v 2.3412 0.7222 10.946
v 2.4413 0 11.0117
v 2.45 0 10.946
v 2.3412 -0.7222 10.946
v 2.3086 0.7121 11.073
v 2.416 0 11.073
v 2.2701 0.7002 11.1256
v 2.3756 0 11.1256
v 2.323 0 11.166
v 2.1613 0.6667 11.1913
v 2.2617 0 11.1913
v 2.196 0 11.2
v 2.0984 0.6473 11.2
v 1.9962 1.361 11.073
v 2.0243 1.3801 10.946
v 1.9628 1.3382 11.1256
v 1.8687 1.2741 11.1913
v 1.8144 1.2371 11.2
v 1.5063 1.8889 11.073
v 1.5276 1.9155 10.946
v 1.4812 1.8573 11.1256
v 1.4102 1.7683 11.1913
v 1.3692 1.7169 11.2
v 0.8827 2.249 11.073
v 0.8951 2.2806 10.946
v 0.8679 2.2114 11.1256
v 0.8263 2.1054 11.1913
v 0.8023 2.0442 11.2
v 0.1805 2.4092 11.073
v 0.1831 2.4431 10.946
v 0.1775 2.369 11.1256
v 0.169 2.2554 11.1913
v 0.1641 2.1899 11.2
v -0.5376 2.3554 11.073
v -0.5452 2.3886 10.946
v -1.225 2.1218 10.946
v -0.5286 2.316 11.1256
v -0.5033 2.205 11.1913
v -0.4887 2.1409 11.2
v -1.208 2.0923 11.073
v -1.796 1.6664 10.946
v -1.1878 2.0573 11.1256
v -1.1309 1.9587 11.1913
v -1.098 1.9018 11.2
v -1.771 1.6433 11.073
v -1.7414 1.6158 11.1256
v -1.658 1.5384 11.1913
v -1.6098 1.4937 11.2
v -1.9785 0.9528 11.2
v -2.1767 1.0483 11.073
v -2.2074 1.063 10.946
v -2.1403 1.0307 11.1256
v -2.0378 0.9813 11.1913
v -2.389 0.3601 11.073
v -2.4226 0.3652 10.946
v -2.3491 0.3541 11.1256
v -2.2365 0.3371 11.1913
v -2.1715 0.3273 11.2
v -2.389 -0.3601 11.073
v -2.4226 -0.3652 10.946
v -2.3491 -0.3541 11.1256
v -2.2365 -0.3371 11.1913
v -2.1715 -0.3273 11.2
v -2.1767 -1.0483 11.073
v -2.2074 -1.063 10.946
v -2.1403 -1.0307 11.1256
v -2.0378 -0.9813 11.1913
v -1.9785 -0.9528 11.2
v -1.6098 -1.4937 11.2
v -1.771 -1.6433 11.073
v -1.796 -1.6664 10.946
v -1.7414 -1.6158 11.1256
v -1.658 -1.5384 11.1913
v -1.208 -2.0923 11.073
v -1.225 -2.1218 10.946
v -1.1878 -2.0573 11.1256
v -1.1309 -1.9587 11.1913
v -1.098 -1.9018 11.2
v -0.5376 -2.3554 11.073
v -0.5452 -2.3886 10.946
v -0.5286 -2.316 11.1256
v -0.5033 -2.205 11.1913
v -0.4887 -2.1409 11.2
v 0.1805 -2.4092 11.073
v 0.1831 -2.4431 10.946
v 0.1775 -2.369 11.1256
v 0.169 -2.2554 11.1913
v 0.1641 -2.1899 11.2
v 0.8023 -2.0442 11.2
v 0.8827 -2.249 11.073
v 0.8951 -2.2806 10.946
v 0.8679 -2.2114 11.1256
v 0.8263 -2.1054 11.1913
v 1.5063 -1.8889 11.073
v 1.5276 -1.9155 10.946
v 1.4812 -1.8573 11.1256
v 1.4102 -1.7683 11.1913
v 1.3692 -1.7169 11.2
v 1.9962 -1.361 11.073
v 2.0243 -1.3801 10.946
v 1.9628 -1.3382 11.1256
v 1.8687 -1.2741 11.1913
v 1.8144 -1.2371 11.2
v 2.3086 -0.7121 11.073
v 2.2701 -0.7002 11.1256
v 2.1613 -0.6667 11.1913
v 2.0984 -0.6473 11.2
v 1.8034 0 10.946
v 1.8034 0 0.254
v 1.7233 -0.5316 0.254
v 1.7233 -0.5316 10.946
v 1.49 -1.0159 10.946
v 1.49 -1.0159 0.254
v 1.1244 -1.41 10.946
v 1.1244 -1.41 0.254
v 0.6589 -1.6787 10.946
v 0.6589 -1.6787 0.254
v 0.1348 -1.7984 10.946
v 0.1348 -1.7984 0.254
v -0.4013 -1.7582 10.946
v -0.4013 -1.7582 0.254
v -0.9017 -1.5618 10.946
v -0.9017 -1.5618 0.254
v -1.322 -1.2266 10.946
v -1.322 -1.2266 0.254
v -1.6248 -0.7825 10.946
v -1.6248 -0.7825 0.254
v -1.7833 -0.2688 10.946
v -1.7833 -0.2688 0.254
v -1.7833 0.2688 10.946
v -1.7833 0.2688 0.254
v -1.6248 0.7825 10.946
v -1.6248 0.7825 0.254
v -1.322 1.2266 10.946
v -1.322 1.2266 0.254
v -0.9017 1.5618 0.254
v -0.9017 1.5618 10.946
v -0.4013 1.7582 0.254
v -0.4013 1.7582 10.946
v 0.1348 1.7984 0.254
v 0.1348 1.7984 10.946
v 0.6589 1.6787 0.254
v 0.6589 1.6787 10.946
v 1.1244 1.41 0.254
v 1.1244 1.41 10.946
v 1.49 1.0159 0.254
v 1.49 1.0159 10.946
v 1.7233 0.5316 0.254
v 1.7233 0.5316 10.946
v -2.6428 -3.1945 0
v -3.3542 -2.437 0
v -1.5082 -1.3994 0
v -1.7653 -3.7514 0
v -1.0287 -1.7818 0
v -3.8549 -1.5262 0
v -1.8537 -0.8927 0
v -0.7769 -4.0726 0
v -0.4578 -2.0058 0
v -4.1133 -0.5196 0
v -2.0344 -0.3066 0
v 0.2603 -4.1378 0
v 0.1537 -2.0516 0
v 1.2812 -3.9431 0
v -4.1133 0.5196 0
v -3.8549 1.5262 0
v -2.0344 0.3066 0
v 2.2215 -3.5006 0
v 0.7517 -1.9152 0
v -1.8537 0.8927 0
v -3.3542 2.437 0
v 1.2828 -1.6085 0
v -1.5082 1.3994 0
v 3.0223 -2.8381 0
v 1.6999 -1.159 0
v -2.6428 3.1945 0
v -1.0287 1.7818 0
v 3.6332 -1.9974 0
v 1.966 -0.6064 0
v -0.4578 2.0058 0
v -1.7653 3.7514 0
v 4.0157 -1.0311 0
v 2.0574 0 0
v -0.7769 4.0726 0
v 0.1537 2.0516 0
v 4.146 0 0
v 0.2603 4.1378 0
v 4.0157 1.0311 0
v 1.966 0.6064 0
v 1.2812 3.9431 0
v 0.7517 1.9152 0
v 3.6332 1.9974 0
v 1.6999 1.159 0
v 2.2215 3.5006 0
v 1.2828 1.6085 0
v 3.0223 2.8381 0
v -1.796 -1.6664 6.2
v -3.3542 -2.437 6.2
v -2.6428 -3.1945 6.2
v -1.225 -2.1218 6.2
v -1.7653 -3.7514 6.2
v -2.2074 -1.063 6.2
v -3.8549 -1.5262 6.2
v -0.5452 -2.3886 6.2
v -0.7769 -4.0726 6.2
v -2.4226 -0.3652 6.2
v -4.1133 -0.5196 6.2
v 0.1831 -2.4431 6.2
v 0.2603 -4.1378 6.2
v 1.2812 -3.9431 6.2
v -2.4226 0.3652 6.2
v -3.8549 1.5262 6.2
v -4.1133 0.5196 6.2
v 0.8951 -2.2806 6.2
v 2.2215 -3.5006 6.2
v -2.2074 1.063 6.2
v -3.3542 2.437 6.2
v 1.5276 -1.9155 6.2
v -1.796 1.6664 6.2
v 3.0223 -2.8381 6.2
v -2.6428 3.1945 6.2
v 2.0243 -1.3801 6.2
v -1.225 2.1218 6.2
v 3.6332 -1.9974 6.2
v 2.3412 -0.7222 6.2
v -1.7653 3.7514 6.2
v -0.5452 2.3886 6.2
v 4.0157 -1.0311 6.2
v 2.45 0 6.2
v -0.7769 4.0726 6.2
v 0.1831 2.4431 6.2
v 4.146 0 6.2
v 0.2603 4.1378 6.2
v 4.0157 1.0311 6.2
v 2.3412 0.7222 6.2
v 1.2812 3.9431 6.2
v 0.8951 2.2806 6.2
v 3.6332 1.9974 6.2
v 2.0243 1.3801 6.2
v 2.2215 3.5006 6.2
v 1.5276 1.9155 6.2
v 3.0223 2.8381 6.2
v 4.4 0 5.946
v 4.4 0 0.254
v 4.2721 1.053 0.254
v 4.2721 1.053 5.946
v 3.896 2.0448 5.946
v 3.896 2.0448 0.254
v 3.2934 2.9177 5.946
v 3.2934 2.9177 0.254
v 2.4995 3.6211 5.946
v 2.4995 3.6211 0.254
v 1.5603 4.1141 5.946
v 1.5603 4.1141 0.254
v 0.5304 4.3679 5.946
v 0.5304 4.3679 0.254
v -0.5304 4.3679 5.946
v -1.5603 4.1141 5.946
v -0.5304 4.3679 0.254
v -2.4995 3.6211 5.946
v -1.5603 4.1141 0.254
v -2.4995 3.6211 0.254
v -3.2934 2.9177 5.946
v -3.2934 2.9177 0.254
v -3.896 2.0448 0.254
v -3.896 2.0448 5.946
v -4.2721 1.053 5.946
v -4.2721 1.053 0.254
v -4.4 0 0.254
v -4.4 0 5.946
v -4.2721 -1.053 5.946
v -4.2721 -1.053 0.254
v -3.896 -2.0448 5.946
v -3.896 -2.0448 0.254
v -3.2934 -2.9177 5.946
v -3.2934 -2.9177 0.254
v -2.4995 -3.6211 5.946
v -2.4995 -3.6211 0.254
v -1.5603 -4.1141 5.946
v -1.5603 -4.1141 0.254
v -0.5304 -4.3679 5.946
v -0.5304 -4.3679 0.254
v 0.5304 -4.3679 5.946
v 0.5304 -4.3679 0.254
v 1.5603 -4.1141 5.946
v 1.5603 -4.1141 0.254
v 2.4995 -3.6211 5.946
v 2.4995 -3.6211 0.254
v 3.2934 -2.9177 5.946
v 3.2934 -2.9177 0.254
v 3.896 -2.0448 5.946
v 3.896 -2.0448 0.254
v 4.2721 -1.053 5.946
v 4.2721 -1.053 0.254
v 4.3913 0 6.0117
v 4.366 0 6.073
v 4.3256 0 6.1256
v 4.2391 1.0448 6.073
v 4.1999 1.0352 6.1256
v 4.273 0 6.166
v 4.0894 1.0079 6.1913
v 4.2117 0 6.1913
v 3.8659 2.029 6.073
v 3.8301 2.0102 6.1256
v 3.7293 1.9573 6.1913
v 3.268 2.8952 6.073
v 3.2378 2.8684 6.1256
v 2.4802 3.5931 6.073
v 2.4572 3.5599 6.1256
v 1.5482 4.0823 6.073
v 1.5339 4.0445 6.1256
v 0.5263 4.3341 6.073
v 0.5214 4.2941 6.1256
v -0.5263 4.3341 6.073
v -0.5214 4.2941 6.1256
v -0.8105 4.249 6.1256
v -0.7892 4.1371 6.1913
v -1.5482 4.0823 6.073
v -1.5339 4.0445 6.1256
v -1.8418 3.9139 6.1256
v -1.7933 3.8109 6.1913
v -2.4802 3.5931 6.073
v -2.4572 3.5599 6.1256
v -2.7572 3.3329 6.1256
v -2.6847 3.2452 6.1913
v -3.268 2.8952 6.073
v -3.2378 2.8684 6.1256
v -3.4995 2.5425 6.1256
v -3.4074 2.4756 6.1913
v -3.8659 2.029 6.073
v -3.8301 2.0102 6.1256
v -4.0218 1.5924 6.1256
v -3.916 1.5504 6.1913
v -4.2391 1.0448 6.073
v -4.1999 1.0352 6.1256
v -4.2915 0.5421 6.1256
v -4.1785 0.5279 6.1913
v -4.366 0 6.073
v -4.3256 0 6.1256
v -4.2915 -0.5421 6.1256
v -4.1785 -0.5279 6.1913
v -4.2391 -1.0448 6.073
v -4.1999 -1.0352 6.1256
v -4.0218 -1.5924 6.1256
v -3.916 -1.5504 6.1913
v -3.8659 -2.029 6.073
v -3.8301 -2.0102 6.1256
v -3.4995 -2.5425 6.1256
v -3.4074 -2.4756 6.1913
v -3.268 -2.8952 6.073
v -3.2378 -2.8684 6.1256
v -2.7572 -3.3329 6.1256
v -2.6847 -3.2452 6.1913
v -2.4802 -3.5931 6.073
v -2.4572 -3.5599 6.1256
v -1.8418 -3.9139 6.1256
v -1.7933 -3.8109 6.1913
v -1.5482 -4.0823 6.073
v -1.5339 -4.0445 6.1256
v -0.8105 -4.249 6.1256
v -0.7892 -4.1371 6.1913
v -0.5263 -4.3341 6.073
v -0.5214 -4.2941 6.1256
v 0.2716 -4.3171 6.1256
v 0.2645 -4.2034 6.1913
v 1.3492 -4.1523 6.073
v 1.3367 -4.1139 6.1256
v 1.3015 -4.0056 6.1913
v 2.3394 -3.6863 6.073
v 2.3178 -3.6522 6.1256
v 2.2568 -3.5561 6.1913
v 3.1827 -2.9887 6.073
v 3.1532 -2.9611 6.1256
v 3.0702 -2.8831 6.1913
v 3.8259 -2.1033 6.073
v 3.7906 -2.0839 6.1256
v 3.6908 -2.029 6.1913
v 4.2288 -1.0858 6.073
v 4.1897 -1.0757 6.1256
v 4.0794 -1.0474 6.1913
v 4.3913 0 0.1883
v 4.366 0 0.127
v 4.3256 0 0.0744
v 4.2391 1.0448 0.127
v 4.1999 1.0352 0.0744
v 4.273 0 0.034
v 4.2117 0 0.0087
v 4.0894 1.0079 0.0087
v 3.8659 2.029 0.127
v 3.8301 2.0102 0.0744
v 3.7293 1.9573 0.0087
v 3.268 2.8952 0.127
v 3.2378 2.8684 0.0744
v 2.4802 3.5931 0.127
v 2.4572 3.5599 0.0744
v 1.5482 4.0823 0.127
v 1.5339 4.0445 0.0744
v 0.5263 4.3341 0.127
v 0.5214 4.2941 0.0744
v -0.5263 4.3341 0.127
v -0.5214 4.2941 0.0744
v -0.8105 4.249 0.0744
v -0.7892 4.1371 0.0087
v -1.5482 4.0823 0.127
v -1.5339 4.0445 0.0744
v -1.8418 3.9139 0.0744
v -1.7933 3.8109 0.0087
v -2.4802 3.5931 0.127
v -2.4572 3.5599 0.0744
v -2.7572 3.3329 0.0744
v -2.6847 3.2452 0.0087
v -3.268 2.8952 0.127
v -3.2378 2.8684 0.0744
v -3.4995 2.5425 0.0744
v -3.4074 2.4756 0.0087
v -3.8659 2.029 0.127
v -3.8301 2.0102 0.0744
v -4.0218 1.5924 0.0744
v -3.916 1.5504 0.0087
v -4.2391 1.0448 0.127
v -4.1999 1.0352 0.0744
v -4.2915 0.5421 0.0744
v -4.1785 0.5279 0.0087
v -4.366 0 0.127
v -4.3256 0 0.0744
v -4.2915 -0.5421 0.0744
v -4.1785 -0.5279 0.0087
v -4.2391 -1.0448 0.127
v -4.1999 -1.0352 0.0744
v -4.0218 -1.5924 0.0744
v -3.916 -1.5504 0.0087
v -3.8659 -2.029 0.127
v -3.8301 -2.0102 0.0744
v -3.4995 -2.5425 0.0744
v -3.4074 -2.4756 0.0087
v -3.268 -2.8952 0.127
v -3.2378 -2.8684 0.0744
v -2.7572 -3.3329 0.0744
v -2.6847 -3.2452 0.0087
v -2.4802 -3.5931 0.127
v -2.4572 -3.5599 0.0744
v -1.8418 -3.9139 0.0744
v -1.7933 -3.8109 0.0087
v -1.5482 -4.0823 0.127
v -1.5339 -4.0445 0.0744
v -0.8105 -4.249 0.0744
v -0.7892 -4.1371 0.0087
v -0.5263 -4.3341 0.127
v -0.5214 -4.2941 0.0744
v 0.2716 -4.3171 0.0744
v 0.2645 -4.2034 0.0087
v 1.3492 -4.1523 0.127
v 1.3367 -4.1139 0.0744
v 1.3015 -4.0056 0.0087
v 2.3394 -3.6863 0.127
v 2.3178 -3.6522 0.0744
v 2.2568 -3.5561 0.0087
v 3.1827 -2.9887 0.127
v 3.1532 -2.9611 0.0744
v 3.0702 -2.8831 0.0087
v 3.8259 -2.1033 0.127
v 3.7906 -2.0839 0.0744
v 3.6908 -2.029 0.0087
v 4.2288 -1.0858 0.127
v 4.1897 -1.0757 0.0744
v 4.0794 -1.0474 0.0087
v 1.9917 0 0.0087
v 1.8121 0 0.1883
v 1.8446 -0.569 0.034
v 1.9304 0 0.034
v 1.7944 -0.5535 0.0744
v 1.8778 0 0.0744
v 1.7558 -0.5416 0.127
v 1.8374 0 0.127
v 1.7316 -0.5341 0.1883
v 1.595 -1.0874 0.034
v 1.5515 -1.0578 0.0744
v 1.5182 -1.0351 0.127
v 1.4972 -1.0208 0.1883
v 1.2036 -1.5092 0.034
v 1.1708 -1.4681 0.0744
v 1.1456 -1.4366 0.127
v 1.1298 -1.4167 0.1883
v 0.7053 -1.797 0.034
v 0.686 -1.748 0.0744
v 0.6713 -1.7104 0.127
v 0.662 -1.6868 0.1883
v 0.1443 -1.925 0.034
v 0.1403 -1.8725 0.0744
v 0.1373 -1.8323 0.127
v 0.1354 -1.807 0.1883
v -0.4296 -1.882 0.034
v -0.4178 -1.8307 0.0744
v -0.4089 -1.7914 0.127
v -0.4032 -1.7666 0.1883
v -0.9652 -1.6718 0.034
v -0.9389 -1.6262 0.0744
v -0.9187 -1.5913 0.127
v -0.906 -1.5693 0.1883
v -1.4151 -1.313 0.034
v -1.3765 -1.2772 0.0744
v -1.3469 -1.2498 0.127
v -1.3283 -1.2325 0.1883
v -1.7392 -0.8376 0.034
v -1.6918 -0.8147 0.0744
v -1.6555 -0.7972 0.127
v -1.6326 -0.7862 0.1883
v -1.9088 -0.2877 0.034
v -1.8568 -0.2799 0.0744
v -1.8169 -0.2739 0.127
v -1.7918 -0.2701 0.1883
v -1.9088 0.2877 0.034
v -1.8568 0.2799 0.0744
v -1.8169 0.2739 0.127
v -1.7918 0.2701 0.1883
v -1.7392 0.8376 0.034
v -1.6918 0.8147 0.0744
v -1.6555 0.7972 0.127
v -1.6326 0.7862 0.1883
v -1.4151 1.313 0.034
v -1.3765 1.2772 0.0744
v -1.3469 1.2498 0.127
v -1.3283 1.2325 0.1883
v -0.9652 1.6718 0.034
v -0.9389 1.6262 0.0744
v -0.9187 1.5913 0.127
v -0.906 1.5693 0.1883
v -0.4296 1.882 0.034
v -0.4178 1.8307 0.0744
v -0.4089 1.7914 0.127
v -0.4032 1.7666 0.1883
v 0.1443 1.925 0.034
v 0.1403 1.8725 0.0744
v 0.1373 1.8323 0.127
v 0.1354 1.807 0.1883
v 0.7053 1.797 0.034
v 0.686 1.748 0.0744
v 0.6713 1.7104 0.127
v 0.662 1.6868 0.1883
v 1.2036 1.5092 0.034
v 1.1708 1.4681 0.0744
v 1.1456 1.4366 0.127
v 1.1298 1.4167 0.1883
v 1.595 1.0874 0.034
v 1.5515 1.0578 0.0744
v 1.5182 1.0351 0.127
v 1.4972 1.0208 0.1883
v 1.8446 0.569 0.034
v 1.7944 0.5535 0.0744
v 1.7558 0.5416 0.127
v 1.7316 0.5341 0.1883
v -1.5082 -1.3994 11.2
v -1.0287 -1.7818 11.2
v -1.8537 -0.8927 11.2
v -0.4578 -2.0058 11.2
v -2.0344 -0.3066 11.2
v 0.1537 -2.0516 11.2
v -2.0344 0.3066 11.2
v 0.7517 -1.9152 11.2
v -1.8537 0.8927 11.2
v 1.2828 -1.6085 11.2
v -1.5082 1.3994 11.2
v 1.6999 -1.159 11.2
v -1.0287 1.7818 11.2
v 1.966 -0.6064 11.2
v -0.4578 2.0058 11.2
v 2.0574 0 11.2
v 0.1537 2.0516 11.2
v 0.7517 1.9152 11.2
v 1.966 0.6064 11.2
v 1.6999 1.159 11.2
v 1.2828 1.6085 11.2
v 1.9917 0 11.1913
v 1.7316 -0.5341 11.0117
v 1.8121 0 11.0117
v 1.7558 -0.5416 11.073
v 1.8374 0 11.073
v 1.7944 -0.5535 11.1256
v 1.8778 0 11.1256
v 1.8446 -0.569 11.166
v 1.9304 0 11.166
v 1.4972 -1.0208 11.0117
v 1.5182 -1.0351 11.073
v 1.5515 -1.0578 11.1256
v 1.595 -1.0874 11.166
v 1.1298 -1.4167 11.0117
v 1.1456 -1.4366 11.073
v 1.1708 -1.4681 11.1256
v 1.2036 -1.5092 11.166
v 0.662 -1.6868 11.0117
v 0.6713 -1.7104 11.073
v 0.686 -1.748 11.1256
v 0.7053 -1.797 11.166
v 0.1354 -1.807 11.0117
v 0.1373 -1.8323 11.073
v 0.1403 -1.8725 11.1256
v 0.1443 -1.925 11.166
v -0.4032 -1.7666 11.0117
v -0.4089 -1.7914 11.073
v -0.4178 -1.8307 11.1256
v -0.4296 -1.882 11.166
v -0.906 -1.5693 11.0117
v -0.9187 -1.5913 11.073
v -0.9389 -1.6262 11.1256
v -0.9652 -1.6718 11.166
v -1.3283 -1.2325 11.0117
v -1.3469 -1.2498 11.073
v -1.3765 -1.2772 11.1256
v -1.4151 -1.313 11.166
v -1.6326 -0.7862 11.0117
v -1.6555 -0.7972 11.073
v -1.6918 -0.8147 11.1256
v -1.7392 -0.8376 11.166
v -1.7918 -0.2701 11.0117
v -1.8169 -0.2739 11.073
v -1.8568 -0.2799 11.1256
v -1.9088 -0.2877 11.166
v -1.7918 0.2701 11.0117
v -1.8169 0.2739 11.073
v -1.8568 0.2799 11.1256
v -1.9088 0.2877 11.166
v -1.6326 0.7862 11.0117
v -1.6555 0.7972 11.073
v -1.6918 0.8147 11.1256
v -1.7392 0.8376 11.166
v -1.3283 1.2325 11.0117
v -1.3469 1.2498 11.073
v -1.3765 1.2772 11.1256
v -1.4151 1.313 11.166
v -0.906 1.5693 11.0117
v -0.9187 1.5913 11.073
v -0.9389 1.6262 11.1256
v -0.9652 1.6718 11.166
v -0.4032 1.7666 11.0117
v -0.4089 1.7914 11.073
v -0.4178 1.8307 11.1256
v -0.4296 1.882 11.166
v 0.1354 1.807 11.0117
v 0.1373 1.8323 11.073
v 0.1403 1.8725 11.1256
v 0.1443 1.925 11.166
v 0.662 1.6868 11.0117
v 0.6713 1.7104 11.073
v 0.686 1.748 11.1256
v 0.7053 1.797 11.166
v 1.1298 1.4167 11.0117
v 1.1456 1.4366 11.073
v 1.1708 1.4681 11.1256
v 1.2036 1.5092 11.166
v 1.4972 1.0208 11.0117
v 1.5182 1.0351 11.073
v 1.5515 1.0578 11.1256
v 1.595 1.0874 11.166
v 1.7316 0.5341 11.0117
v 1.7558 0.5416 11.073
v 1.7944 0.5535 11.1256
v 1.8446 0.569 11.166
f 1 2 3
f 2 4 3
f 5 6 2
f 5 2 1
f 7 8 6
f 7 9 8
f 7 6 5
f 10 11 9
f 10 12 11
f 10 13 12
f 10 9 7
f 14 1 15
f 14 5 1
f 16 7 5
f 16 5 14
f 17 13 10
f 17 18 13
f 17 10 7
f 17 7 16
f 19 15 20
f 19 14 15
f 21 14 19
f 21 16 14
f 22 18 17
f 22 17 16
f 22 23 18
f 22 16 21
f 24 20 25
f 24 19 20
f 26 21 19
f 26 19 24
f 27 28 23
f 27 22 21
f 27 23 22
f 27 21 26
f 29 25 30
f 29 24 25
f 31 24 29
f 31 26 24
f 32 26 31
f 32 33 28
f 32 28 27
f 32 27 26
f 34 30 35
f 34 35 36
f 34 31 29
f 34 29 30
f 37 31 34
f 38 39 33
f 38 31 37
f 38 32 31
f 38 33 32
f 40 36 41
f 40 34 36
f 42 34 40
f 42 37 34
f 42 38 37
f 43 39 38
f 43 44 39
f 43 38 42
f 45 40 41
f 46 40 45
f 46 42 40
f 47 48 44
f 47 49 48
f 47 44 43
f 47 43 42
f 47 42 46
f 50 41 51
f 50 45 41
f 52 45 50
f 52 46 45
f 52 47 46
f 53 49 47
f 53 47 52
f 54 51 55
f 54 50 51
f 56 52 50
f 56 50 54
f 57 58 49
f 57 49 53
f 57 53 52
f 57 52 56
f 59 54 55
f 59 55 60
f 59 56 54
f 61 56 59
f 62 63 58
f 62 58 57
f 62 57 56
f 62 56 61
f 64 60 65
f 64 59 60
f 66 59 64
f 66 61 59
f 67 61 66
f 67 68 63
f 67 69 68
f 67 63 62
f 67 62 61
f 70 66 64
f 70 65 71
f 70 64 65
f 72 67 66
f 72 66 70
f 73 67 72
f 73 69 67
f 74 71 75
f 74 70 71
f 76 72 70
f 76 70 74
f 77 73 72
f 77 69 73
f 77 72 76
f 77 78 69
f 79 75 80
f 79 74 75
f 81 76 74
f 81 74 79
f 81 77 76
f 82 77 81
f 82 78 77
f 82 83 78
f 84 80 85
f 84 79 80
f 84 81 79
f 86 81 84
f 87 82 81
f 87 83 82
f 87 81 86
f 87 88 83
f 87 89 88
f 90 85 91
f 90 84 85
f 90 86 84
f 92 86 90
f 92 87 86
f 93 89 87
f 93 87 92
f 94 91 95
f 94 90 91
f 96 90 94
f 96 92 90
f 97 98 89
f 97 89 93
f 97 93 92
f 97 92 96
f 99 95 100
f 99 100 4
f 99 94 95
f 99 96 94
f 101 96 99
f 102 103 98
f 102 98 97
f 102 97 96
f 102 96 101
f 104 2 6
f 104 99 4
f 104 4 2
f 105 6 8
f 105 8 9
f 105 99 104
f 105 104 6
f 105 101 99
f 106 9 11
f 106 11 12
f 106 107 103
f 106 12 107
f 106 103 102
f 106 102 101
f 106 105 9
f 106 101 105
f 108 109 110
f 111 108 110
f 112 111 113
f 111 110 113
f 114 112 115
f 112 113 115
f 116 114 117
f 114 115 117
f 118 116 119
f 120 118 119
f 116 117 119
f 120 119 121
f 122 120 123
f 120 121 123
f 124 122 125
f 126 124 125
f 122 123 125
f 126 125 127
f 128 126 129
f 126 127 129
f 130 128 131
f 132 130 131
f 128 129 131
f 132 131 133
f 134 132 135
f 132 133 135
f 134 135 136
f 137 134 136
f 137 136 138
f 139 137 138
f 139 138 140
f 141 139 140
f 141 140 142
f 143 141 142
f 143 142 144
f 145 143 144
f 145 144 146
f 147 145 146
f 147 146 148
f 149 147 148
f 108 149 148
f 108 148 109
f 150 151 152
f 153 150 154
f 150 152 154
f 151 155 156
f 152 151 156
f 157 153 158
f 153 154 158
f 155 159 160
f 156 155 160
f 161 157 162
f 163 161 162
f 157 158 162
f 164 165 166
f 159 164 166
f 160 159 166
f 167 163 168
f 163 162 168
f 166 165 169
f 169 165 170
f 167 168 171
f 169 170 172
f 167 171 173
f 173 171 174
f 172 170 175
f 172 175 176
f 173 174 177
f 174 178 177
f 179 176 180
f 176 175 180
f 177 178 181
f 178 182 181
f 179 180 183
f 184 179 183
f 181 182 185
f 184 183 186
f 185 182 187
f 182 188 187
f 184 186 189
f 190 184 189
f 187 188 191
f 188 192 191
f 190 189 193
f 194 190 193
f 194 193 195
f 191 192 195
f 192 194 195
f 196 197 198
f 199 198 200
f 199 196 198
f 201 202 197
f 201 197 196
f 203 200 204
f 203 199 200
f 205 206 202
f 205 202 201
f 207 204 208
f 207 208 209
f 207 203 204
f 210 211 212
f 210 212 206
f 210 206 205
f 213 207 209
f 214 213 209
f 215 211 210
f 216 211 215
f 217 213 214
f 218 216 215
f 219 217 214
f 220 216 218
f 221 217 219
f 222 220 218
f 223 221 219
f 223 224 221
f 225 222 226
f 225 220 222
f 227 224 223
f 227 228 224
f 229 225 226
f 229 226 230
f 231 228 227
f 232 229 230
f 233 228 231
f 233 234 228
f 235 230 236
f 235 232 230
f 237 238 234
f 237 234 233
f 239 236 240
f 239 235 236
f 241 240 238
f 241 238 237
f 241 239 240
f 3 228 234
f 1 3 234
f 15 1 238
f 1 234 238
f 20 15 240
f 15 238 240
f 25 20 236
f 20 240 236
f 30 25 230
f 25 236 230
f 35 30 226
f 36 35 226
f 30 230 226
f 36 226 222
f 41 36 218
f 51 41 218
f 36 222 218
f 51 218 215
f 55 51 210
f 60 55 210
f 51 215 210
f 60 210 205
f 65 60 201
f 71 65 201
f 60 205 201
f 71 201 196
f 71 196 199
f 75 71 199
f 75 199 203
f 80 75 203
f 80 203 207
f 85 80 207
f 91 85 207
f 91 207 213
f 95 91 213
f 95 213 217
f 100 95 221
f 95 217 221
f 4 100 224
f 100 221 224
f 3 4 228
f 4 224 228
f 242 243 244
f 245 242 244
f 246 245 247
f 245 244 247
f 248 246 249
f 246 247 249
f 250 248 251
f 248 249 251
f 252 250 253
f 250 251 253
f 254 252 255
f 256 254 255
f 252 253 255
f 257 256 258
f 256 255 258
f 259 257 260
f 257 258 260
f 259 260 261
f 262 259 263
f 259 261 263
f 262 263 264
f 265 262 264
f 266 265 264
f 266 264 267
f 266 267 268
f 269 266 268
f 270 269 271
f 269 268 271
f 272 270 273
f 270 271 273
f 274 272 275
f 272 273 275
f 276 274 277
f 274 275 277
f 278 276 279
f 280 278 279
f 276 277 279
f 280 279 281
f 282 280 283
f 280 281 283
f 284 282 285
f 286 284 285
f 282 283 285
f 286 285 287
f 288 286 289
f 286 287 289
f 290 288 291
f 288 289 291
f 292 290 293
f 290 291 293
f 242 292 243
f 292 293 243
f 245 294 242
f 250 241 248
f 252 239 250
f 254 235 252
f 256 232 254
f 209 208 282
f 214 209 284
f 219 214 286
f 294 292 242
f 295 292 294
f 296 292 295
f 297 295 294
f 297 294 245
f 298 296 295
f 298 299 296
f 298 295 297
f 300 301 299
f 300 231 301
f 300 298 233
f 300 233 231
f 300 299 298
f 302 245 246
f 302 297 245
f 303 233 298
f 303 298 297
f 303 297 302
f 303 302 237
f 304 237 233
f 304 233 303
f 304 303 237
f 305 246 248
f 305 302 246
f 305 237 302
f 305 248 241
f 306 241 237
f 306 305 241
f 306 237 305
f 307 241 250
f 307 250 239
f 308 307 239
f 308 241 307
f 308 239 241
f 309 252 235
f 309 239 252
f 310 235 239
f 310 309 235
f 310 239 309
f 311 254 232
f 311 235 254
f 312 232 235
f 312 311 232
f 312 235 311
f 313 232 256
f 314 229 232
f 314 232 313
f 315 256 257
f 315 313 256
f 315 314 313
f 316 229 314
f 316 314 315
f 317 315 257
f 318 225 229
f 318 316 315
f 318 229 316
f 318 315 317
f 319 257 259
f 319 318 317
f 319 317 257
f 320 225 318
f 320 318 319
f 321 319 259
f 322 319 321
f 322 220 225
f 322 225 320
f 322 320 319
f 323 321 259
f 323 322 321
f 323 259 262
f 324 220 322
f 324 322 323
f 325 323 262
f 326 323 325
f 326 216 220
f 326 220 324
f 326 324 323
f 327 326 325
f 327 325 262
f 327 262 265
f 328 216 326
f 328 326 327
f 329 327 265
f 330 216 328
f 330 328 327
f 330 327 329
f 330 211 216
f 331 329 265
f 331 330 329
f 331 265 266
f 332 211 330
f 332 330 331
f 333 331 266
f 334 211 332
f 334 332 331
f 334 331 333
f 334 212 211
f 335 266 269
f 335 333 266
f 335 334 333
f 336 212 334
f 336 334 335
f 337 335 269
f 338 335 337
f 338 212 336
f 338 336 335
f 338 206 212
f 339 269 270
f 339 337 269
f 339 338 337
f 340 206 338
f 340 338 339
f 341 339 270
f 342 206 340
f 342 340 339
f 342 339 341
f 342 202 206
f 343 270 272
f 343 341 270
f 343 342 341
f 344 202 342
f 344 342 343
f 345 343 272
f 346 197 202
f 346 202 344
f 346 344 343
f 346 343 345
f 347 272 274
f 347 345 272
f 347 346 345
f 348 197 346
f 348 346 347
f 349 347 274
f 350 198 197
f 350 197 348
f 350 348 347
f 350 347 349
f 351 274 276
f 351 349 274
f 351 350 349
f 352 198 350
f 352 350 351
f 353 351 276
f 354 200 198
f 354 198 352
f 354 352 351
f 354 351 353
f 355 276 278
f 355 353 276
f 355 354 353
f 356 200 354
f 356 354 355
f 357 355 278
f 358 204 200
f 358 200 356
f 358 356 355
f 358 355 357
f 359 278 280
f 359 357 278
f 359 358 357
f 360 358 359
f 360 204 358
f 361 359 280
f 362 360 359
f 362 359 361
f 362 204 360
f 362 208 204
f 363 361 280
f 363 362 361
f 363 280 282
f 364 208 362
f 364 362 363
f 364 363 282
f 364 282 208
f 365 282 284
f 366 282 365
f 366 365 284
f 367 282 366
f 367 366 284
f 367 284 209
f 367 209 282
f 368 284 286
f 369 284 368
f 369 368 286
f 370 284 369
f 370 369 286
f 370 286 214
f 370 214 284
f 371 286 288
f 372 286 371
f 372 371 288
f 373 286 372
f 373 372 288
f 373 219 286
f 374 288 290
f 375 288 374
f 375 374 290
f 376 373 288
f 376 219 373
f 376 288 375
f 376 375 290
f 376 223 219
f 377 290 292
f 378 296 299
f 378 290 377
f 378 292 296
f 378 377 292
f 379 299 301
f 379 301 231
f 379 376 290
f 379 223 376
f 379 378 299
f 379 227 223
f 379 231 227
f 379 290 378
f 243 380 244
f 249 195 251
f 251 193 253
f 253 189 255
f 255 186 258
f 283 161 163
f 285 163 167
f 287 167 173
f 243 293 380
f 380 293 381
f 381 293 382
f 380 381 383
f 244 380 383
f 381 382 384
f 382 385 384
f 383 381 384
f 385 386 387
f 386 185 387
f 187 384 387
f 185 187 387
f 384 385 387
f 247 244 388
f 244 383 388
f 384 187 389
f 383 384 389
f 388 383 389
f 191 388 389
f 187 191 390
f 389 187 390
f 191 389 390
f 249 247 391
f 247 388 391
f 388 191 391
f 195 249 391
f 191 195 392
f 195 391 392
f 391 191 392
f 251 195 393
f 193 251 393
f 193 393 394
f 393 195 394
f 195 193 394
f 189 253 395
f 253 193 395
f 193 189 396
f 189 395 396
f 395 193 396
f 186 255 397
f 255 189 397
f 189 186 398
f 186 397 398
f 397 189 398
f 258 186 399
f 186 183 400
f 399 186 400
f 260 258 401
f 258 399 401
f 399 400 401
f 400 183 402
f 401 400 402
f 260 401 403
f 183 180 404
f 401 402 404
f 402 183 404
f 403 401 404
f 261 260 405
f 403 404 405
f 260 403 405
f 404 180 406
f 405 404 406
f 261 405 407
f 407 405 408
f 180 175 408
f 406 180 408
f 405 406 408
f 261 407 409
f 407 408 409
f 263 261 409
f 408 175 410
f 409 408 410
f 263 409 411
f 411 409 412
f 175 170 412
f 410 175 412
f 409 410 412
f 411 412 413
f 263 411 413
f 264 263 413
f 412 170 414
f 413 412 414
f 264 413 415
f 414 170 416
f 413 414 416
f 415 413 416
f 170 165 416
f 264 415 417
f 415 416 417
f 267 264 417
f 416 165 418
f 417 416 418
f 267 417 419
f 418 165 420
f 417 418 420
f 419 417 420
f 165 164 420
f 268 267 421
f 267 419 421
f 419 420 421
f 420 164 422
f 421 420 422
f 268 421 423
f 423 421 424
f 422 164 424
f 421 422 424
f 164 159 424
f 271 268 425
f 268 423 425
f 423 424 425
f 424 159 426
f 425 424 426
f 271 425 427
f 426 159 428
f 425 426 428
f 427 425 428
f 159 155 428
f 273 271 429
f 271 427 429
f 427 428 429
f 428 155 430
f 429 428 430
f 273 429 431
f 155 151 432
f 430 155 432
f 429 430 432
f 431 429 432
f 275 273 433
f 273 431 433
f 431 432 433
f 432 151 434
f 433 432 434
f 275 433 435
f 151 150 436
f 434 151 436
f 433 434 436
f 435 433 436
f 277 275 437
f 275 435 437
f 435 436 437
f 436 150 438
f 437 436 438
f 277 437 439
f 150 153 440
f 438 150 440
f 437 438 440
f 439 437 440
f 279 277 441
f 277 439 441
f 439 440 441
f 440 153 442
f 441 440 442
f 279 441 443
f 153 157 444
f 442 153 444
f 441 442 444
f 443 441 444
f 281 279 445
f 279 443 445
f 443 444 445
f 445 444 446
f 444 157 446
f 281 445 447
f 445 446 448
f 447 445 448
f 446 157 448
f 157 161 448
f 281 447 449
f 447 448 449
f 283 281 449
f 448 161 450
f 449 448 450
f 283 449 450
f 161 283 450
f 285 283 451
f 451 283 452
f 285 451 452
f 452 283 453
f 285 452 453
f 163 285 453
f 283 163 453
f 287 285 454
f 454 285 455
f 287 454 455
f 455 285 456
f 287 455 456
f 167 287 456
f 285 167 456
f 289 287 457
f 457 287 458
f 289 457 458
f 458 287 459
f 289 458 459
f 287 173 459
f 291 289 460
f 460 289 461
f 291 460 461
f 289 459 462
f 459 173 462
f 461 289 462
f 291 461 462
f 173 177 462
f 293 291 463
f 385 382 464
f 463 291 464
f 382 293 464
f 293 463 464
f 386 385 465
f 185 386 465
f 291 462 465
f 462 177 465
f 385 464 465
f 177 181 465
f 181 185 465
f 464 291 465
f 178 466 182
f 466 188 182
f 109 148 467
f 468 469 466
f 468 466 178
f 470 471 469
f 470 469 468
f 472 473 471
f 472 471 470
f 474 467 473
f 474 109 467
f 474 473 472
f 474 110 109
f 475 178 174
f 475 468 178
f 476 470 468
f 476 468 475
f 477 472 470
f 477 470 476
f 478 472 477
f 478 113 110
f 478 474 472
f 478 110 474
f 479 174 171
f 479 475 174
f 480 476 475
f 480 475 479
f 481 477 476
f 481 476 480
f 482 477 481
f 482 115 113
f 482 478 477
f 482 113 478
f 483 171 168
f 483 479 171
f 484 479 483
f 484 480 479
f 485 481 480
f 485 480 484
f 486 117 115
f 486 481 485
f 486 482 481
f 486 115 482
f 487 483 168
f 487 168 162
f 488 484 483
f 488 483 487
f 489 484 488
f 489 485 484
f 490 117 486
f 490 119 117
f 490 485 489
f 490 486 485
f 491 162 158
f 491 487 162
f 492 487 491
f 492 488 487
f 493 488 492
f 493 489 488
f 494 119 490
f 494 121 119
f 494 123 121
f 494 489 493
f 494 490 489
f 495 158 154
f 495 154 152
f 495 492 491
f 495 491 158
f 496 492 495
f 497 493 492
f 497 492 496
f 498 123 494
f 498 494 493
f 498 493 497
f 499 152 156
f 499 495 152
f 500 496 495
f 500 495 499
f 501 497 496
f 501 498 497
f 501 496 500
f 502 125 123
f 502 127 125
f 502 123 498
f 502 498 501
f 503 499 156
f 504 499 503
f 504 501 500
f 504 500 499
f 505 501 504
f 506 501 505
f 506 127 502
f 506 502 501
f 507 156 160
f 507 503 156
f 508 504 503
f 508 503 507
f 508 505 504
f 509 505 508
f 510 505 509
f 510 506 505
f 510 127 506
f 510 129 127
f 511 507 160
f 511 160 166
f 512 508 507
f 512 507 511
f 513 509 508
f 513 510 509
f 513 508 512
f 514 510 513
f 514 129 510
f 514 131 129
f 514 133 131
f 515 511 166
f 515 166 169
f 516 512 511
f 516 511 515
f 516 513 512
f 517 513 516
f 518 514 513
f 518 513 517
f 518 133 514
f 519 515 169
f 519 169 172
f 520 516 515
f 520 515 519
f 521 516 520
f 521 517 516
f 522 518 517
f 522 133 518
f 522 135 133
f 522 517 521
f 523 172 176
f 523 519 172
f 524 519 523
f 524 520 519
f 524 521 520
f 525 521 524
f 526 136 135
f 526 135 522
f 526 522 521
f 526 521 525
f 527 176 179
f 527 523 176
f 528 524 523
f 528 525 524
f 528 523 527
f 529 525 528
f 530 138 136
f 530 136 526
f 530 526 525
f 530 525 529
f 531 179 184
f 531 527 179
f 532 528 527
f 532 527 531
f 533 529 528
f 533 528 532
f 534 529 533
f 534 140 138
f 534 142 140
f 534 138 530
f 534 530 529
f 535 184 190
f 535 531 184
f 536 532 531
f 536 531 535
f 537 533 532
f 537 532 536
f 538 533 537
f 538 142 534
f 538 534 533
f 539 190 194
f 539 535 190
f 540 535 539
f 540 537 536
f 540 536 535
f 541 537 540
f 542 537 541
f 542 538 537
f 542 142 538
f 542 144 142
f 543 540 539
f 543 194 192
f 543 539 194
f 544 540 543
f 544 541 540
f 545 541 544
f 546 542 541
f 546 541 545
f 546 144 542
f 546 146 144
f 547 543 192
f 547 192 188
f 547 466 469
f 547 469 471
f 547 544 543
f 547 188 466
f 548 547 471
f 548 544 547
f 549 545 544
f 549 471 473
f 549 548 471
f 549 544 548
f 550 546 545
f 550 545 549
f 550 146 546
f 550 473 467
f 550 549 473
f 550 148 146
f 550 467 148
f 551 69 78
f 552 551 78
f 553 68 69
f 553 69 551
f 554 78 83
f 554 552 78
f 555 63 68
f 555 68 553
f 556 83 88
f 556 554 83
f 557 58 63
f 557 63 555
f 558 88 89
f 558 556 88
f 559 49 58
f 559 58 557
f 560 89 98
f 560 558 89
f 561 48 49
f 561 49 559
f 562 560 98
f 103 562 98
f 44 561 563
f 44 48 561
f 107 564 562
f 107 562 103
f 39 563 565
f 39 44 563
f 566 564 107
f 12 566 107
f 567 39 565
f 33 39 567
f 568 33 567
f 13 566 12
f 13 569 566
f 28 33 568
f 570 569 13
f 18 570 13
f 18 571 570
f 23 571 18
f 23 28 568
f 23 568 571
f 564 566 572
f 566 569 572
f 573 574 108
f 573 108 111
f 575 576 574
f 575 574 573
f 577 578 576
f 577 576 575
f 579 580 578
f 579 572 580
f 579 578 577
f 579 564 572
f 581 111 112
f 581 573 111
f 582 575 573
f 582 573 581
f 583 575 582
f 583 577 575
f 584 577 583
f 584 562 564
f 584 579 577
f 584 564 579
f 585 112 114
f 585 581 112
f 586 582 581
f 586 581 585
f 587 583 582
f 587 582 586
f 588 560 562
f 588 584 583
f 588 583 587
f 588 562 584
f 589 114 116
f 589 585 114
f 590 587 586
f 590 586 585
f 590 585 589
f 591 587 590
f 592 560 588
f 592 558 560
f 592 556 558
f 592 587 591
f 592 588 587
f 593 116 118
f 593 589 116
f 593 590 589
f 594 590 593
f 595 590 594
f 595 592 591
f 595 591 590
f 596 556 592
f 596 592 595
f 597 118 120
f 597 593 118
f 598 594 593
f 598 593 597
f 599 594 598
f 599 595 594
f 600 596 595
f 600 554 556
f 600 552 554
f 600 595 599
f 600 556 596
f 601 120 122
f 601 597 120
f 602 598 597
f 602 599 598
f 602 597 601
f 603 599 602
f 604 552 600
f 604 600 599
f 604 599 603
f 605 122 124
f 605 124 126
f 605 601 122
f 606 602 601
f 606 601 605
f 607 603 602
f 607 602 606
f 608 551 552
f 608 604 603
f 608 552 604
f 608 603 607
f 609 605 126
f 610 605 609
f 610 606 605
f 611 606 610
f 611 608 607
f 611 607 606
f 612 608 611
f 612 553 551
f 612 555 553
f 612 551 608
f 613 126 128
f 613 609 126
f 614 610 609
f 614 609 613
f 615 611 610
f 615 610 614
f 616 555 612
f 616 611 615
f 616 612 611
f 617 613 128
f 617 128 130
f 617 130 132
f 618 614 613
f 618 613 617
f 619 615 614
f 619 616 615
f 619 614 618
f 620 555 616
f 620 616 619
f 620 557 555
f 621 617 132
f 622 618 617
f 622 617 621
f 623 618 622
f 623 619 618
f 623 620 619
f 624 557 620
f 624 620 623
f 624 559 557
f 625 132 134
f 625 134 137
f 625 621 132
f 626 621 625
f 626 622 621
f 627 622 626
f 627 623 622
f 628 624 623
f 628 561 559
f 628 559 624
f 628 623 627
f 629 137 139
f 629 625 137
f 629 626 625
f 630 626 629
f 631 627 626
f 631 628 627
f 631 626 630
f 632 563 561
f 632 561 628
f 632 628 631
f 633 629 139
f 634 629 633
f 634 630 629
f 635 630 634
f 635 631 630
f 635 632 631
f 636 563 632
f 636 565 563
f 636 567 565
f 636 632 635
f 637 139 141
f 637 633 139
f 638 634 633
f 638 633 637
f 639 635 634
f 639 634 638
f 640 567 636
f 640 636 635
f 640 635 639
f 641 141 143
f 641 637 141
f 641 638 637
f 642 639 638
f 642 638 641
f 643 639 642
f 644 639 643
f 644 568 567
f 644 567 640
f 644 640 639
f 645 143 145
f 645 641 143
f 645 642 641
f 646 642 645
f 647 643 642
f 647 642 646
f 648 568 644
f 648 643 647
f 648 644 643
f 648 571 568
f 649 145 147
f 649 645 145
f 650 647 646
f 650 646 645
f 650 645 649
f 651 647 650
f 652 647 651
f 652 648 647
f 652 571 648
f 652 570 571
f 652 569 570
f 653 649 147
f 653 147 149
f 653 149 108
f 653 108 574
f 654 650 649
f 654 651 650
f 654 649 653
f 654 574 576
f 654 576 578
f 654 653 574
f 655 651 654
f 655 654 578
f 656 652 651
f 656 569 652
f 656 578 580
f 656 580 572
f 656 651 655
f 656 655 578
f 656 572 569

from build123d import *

# Parameters (mm, degrees)
F0_R     = 4.4
F1_DEPTH = 6.2
F2_R     = 2.45
F3_DEPTH = 5
F4_R     = 1.8034
F5_DEPTH = 11.201
F6_R     = 0.254


with BuildPart() as f1:
    # F0 (on Top) → F1 (new body)
    with BuildSketch(Plane.XY):
        Circle(F0_R)
    extrude(amount=F1_DEPTH)

    # F2 (on face) → F3 (join)
    with BuildSketch(Plane.XY.offset(6.2)):
        Circle(F2_R)
    extrude(amount=F3_DEPTH)

    # F4 (on face) → F5 (cut, through all)
    with BuildSketch(Plane(origin=(0, 0, 0), x_dir=(1, 0, 0), z_dir=(0, 0, -1))):
        Circle(F4_R)
    extrude(amount=-F5_DEPTH, mode=Mode.SUBTRACT)

    # F6
    f6_edges = [f1.edges().sort_by_distance(p)[0] for p in [
        (-2.45, 0, 11.2),
        (-1.8034, 0, 11.2),
        (-4.4, 0, 0),
        (-1.8034, 0, 0),
        (-4.4, 0, 6.2),
    ]]
    fillet(f6_edges, radius=F6_R)


solid = f1.part
